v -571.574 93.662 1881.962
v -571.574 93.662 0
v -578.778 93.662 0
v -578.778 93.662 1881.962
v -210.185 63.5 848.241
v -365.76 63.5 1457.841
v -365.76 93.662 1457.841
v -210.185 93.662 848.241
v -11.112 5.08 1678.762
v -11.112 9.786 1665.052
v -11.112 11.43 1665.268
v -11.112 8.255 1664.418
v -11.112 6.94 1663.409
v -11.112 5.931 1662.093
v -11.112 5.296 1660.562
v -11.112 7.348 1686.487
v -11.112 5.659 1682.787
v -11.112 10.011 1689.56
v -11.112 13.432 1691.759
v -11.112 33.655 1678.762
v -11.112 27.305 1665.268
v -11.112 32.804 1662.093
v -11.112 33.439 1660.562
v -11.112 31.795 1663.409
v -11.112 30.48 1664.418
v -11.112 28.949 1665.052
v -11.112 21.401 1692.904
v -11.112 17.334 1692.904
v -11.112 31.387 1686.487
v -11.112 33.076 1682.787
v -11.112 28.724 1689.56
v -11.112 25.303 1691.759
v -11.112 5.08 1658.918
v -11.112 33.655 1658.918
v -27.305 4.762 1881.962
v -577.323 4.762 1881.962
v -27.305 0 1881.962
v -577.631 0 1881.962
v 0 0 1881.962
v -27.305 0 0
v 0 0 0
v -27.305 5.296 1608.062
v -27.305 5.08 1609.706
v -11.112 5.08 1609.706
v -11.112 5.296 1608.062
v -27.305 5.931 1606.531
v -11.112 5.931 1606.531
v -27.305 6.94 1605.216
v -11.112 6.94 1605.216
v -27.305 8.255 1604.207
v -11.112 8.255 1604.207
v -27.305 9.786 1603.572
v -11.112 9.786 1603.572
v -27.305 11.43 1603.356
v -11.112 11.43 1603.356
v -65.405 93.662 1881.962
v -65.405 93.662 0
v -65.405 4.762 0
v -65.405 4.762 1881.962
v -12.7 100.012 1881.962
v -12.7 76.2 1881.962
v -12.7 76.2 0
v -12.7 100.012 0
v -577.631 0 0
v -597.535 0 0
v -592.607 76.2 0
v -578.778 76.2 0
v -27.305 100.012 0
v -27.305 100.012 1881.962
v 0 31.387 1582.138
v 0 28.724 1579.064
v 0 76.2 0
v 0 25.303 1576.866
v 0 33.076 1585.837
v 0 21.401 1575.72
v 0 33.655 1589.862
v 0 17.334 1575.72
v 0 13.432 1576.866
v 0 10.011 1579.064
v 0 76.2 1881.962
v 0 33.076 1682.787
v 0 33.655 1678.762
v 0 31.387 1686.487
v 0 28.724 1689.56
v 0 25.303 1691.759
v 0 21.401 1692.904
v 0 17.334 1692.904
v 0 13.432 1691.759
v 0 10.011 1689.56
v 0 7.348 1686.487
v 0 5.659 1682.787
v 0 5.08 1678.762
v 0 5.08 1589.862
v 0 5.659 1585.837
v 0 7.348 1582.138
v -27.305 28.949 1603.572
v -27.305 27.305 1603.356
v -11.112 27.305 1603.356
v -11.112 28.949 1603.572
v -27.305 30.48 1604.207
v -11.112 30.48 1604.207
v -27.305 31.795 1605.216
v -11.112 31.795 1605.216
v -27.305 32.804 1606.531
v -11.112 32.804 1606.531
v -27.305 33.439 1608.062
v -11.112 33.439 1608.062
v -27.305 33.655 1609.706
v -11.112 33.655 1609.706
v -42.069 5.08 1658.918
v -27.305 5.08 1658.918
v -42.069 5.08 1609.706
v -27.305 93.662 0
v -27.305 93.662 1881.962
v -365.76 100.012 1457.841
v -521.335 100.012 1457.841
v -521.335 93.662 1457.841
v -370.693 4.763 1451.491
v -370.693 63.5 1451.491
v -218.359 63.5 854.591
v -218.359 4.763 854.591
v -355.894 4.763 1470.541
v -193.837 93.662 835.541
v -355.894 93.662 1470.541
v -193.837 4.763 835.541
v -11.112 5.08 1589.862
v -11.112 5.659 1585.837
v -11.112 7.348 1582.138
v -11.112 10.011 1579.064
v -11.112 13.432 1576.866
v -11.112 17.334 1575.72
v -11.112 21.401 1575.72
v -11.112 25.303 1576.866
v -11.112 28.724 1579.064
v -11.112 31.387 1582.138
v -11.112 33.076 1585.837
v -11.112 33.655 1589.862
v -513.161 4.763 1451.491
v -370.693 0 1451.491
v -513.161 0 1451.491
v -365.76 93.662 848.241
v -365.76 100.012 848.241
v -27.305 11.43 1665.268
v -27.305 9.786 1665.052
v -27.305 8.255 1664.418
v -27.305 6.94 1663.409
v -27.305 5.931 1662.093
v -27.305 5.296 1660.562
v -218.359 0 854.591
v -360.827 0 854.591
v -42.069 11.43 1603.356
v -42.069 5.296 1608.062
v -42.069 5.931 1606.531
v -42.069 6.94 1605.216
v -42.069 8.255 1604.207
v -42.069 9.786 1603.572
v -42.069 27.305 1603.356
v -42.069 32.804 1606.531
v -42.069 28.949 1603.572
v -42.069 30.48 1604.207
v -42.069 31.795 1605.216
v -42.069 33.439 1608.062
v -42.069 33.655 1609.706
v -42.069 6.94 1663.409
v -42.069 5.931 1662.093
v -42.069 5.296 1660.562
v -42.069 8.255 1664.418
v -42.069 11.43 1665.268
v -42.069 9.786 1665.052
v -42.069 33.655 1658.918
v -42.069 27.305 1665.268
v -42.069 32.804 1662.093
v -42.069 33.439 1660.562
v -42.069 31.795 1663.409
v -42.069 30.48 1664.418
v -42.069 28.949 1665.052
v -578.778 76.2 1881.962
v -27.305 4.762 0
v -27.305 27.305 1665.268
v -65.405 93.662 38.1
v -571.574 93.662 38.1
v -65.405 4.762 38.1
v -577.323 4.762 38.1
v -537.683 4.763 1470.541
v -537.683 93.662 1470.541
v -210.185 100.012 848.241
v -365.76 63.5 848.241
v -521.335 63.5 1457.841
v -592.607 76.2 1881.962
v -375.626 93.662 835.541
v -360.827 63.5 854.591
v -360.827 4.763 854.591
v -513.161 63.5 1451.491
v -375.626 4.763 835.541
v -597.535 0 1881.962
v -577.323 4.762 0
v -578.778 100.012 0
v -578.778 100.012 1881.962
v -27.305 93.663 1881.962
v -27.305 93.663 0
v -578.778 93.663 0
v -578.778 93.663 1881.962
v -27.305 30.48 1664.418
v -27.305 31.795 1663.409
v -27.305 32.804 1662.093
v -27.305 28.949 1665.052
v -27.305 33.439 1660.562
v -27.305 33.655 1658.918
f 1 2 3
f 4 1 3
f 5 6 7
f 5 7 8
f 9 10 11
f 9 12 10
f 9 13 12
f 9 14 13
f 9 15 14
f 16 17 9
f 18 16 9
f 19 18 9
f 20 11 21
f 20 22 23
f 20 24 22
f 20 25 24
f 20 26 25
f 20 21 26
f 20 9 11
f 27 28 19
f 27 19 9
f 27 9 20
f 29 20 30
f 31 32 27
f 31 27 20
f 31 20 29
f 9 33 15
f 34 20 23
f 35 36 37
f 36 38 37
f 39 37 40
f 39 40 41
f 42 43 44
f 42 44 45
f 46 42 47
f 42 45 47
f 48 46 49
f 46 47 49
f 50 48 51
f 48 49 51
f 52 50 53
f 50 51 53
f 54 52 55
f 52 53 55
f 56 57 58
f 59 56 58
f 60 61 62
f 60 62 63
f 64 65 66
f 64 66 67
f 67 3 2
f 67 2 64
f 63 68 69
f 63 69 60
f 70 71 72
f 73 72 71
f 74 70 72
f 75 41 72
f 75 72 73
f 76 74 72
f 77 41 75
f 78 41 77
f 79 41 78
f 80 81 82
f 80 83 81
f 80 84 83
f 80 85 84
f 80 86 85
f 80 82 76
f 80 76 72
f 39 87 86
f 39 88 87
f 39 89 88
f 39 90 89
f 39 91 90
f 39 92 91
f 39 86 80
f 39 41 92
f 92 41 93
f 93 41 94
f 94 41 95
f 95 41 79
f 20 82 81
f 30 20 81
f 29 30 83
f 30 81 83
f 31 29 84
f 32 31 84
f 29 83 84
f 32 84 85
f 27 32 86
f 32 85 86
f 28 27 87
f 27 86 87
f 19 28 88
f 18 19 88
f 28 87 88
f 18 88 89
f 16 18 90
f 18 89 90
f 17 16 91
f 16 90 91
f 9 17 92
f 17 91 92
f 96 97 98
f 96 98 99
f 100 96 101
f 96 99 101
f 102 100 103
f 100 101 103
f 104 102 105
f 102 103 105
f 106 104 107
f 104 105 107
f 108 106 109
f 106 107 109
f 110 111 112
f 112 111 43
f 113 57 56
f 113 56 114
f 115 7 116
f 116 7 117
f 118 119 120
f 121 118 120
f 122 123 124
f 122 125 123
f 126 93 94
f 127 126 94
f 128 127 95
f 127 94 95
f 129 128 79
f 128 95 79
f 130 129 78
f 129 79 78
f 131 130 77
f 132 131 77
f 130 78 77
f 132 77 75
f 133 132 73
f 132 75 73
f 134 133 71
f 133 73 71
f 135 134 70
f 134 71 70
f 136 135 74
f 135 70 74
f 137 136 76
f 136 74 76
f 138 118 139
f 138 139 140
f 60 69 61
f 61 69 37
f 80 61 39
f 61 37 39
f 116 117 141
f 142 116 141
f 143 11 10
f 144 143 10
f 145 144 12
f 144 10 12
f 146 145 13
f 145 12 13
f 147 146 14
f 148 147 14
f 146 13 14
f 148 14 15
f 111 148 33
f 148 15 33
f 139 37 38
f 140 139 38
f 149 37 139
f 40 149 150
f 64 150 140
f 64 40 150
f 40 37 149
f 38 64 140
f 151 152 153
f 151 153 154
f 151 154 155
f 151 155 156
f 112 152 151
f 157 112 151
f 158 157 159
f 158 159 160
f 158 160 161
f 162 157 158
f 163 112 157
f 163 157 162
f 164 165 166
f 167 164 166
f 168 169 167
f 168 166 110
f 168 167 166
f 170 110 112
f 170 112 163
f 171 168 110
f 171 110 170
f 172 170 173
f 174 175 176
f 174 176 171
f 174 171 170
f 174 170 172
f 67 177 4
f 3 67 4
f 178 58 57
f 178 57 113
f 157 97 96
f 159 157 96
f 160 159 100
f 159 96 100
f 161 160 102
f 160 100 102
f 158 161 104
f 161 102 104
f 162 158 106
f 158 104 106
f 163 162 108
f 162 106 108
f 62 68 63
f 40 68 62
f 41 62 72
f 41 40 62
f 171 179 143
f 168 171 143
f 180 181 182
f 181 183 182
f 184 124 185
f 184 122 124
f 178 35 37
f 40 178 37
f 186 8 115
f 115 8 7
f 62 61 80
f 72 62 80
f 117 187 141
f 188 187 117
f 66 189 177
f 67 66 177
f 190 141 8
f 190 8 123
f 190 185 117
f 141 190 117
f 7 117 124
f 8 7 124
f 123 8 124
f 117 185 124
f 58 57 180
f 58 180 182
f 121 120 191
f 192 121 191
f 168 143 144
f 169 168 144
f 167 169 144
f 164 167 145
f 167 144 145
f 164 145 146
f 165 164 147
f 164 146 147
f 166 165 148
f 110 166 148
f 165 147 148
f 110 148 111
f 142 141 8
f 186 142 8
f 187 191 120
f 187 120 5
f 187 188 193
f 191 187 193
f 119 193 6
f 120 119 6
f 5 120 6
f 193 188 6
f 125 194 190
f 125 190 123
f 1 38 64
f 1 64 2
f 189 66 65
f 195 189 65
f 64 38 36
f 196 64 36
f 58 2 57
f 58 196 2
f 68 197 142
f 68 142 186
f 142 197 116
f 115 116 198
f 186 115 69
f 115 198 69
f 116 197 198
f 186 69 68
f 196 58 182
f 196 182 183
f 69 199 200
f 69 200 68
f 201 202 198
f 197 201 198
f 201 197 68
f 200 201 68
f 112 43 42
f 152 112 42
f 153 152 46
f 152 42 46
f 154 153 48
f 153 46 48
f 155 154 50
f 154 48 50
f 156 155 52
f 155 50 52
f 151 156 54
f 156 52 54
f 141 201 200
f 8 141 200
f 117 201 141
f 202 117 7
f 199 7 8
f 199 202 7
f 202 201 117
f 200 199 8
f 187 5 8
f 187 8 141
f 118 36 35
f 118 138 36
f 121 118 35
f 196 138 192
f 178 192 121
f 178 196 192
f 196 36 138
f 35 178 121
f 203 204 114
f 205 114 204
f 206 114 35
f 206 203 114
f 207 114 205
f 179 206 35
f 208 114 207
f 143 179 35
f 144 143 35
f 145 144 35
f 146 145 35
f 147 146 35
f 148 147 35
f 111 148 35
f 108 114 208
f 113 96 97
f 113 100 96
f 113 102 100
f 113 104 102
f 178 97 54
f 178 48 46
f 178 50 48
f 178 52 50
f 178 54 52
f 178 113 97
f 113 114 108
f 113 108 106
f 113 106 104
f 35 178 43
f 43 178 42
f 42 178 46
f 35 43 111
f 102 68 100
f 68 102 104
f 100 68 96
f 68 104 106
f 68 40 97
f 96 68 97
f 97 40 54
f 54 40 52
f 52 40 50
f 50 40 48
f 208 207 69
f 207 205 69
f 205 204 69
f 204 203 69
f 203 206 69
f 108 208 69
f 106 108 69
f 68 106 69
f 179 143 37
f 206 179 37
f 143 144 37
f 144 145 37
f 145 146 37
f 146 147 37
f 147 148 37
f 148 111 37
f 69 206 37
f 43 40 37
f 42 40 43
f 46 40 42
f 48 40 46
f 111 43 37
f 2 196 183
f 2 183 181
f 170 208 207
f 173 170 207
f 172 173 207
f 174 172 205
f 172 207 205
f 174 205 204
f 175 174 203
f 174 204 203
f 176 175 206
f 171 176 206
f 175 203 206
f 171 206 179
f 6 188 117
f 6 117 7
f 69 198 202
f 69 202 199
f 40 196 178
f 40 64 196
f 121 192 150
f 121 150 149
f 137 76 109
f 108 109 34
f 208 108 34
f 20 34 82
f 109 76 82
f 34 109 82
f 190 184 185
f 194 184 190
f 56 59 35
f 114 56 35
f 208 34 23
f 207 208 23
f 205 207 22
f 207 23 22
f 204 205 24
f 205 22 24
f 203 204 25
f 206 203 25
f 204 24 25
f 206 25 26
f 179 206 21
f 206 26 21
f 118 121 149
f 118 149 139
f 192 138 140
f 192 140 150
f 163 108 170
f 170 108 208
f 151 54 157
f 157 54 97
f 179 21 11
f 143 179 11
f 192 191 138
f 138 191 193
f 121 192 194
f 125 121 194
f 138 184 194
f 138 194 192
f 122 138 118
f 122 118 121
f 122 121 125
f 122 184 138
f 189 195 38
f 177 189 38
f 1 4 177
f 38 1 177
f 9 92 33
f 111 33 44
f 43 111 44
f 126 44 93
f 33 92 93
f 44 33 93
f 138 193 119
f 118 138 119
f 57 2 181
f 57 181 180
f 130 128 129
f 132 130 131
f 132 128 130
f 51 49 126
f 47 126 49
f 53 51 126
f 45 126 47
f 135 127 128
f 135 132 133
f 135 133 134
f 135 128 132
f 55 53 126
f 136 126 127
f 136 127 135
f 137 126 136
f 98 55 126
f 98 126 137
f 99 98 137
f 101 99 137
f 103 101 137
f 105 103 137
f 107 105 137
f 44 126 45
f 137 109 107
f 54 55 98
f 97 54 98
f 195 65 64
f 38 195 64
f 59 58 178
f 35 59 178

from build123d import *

# Parameters (mm, degrees)
F0_W      = 27.305
F0_H      = 1881.9622
F1_DEPTH  = 100.0125
F2_W      = 38.1
F2_H      = 88.9
F3_DEPTH  = 1881.9622
F6_DEPTH  = 1881.9622
F8_DEPTH  = 1881.9622
F10_DEPTH = 38.1
F12_DEPTH = 11.1125
F14_DEPTH = 30.95625
F16_DEPTH = 596.43992
F17_W     = 12.7
F17_H     = 23.8125
F18_DEPTH = 1881.9632
F19_W     = 551.4731178237
F19_H     = 6.35
F20_DEPTH = 1881.9622
F23_DEPTH = 6.351
F26_DEPTH = 58.7375
F27_DEPTH = 30.1625
F28_DEPTH = 63.501


with BuildPart() as f1:
    # F0 (on Front) → F1 (new body)
    with BuildSketch(Plane.XZ):
        with Locations((-13.6525, 940.9811)):
            Rectangle(F0_W, F0_H)
    extrude(amount=-F1_DEPTH)

    # F11 (on face) → F12 (cut)
    with BuildSketch(Plane.YZ):
        with BuildLine():
            Line((5.08, 1678.7622), (5.08, 1589.8622))
            ThreePointArc((5.08, 1589.8622), (19.3675, 1575.5747), (33.655, 1589.8622))
            Line((33.655, 1589.8622), (33.655, 1678.7622))
            ThreePointArc((33.655, 1678.7622), (19.3675, 1693.0497), (5.08, 1678.7622))
        make_face()
    extrude(amount=-F12_DEPTH, mode=Mode.SUBTRACT)


with BuildPart() as f3:
    # F2 (on face) → F3 (new body, through all)
    with BuildSketch(Plane(origin=(0, 0, 0), x_dir=(1, 0, 0), z_dir=(0, 0, -1))):
        with Locations((-46.355, -49.2125)):
            Rectangle(F2_W, F2_H)
    extrude(amount=-F3_DEPTH)


with BuildPart() as f6:
    # F5 (on Top) → F6 (new body, through all)
    with BuildSketch(Plane.XY):
        Polygon((-571.5738296892, 93.6625), (-591.4781178237, 93.6625), (-597.535, 0), (-577.6307118655, 0), align=None)
    extrude(amount=F6_DEPTH)


with BuildPart() as f8:
    # F7 (on face) → F8 (new body, through all)
    with BuildSketch(Plane(origin=(0, 0, 0), x_dir=(1, 0, 0), z_dir=(0, 0, -1))):
        Polygon((-577.3227348057, -4.7625), (-27.305, -4.7625), (-27.305, 0), (-577.6307118655, 0), align=None)
    extrude(amount=-F8_DEPTH)

    # F25 (on offset) → F28 (cut, through all)
    with BuildSketch(Plane.XZ.offset(-63.5)):
        Polygon((-370.6929571686, 1451.4914666667), (-513.160896998, 1451.4914666667), (-360.8270428314, 854.5914666668), (-218.3591030019, 854.5914666667), align=None)
    extrude(amount=F28_DEPTH, mode=Mode.SUBTRACT)


with BuildPart() as f10:
    # F9 (on face) → F10 (new body)
    with BuildSketch(Plane(origin=(0, 0, 0), x_dir=(1, 0, 0), z_dir=(0, 0, -1))):
        Polygon((-571.5738296892, -93.6625), (-65.405, -93.6625), (-65.405, -4.7625), (-577.3227348057, -4.7625), align=None)
    extrude(amount=-F10_DEPTH)


with BuildPart() as f14_tool:
    # F13 (on face) → F14 (new body)
    with BuildSketch(Plane.YZ.offset(-11.1125)):
        with BuildLine():
            Line((27.305, 1665.26845), (11.43, 1665.26845))
            ThreePointArc((11.43, 1665.26845), (6.9398719395, 1663.4085780605), (5.08, 1658.91845))
            Line((5.08, 1658.91845), (5.08, 1609.70595))
            ThreePointArc((5.08, 1609.70595), (6.9398719395, 1605.2158219395), (11.43, 1603.35595))
            Line((11.43, 1603.35595), (27.305, 1603.35595))
            ThreePointArc((27.305, 1603.35595), (31.7951280605, 1605.2158219395), (33.655, 1609.70595))
            Line((33.655, 1609.70595), (33.655, 1658.91845))
            ThreePointArc((33.655, 1658.91845), (31.7951280605, 1663.4085780605), (27.305, 1665.26845))
        make_face()
    extrude(amount=-F14_DEPTH)


with BuildPart() as f1_1:
    add(f1.part)

    # F14: cut by f14_tool
    add(f14_tool.part, mode=Mode.SUBTRACT)


with BuildPart() as f3_1:
    add(f3.part)

    # F14: cut by f14_tool
    add(f14_tool.part, mode=Mode.SUBTRACT)


with BuildPart() as f16:
    # F15 (on offset) → F16 (new body)
    with BuildSketch(Plane.YZ.offset(-600.71)):
        Polygon((-20.0647553623, 1526.7833842013), (-9.9087004615, 1526.5002784738), (0, 1881.9622), align=None)
    extrude(amount=F16_DEPTH)


with BuildPart() as f16b:
    # F15 (on offset) → F16, piece 2 (new body)
    with BuildSketch(Plane.YZ.offset(-600.71)):
        Polygon((-16.3270426588, 1386.8002784738), (-6.1685714286, 1386.6240335758), (0, 1742.1705266348), (-9.9087004615, 1526.5002784738), align=None)
    extrude(amount=F16_DEPTH)


with BuildPart() as f16c:
    # F15 (on offset) → F16, piece 3 (new body)
    with BuildSketch(Plane.YZ.offset(-600.71)):
        Polygon((0, 1246.9240335758), (0, 1602.5240335758), (-6.1685714286, 1386.6240335758), (-10.16, 1246.9240335758), align=None)
    extrude(amount=F16_DEPTH)


with BuildPart() as f18_tool:
    # F17 (on face) → F18 (new body, through all)
    with BuildSketch(Plane.XY.offset(1881.9622)):
        with Locations((-6.35, 88.10625)):
            Rectangle(F17_W, F17_H)
        Polygon((-592.607367043, 76.2), (-591.4781178237, 76.2), (-578.7781178237, 76.2), (-578.7781178237, 93.6625), (-591.4781178237, 93.6625), align=None)
    extrude(amount=-F18_DEPTH)


with BuildPart() as f1_2:
    add(f1_1.part)

    # F18: cut by f18_tool
    add(f18_tool.part, mode=Mode.SUBTRACT)


with BuildPart() as f6_1:
    add(f6.part)

    # F18: cut by f18_tool
    add(f18_tool.part, mode=Mode.SUBTRACT)


with BuildPart() as f20:
    # F19 (on face) → F20 (new body, through all)
    with BuildSketch(Plane.XY.offset(1881.9622)):
        with Locations((-303.0415589119, 96.8375)):
            Rectangle(F19_W, F19_H)
    extrude(amount=-F20_DEPTH)

    # F22 (on face) → F23 (cut, through all)
    with BuildSketch(Plane.XZ.offset(-93.6625)):
        Polygon((-365.76, 1457.8414666667), (-521.335, 1457.8414666667), (-365.76, 848.2414666666), (-210.185, 848.2414666667), align=None)
    extrude(amount=-F23_DEPTH, mode=Mode.SUBTRACT)


with BuildPart() as f26:
    # F25 (on offset) → F26 (new body, through all)
    with BuildSketch(Plane.XZ.offset(-63.5)):
        Polygon((-355.8940856629, 1470.5414666667), (-537.6832060038, 1470.5414666667), (-375.6259143372, 835.5414666669), (-193.8367939962, 835.5414666667), align=None)
        Polygon((-365.76, 848.241466667), (-521.3350000002, 1457.8414666674), (-365.76, 1457.8414666667), (-210.1850000001, 848.2414666671), align=None, mode=Mode.SUBTRACT)
        Polygon((-365.76, 1457.8414666667), (-521.335, 1457.8414666667), (-365.76, 848.241466667), (-210.185, 848.2414666667), align=None)
        Polygon((-360.8270428314, 854.5914666668), (-513.1608969981, 1451.4914666668), (-370.6929571686, 1451.4914666667), (-218.359103002, 854.591466667), align=None, mode=Mode.SUBTRACT)
    extrude(amount=F26_DEPTH)

    # F25 (on offset) → F27 (join, through all)
    with BuildSketch(Plane.XZ.offset(-63.5)):
        Polygon((-355.8940856629, 1470.5414666667), (-537.6832060038, 1470.5414666667), (-375.6259143372, 835.5414666669), (-193.8367939962, 835.5414666667), align=None)
        Polygon((-365.76, 848.241466667), (-521.3350000002, 1457.8414666674), (-365.76, 1457.8414666667), (-210.1850000001, 848.2414666671), align=None, mode=Mode.SUBTRACT)
    extrude(amount=-F27_DEPTH)


solid = Compound([f8.part, f10.part, f3_1.part, f1_2.part, f6_1.part, f20.part, f26.part])
